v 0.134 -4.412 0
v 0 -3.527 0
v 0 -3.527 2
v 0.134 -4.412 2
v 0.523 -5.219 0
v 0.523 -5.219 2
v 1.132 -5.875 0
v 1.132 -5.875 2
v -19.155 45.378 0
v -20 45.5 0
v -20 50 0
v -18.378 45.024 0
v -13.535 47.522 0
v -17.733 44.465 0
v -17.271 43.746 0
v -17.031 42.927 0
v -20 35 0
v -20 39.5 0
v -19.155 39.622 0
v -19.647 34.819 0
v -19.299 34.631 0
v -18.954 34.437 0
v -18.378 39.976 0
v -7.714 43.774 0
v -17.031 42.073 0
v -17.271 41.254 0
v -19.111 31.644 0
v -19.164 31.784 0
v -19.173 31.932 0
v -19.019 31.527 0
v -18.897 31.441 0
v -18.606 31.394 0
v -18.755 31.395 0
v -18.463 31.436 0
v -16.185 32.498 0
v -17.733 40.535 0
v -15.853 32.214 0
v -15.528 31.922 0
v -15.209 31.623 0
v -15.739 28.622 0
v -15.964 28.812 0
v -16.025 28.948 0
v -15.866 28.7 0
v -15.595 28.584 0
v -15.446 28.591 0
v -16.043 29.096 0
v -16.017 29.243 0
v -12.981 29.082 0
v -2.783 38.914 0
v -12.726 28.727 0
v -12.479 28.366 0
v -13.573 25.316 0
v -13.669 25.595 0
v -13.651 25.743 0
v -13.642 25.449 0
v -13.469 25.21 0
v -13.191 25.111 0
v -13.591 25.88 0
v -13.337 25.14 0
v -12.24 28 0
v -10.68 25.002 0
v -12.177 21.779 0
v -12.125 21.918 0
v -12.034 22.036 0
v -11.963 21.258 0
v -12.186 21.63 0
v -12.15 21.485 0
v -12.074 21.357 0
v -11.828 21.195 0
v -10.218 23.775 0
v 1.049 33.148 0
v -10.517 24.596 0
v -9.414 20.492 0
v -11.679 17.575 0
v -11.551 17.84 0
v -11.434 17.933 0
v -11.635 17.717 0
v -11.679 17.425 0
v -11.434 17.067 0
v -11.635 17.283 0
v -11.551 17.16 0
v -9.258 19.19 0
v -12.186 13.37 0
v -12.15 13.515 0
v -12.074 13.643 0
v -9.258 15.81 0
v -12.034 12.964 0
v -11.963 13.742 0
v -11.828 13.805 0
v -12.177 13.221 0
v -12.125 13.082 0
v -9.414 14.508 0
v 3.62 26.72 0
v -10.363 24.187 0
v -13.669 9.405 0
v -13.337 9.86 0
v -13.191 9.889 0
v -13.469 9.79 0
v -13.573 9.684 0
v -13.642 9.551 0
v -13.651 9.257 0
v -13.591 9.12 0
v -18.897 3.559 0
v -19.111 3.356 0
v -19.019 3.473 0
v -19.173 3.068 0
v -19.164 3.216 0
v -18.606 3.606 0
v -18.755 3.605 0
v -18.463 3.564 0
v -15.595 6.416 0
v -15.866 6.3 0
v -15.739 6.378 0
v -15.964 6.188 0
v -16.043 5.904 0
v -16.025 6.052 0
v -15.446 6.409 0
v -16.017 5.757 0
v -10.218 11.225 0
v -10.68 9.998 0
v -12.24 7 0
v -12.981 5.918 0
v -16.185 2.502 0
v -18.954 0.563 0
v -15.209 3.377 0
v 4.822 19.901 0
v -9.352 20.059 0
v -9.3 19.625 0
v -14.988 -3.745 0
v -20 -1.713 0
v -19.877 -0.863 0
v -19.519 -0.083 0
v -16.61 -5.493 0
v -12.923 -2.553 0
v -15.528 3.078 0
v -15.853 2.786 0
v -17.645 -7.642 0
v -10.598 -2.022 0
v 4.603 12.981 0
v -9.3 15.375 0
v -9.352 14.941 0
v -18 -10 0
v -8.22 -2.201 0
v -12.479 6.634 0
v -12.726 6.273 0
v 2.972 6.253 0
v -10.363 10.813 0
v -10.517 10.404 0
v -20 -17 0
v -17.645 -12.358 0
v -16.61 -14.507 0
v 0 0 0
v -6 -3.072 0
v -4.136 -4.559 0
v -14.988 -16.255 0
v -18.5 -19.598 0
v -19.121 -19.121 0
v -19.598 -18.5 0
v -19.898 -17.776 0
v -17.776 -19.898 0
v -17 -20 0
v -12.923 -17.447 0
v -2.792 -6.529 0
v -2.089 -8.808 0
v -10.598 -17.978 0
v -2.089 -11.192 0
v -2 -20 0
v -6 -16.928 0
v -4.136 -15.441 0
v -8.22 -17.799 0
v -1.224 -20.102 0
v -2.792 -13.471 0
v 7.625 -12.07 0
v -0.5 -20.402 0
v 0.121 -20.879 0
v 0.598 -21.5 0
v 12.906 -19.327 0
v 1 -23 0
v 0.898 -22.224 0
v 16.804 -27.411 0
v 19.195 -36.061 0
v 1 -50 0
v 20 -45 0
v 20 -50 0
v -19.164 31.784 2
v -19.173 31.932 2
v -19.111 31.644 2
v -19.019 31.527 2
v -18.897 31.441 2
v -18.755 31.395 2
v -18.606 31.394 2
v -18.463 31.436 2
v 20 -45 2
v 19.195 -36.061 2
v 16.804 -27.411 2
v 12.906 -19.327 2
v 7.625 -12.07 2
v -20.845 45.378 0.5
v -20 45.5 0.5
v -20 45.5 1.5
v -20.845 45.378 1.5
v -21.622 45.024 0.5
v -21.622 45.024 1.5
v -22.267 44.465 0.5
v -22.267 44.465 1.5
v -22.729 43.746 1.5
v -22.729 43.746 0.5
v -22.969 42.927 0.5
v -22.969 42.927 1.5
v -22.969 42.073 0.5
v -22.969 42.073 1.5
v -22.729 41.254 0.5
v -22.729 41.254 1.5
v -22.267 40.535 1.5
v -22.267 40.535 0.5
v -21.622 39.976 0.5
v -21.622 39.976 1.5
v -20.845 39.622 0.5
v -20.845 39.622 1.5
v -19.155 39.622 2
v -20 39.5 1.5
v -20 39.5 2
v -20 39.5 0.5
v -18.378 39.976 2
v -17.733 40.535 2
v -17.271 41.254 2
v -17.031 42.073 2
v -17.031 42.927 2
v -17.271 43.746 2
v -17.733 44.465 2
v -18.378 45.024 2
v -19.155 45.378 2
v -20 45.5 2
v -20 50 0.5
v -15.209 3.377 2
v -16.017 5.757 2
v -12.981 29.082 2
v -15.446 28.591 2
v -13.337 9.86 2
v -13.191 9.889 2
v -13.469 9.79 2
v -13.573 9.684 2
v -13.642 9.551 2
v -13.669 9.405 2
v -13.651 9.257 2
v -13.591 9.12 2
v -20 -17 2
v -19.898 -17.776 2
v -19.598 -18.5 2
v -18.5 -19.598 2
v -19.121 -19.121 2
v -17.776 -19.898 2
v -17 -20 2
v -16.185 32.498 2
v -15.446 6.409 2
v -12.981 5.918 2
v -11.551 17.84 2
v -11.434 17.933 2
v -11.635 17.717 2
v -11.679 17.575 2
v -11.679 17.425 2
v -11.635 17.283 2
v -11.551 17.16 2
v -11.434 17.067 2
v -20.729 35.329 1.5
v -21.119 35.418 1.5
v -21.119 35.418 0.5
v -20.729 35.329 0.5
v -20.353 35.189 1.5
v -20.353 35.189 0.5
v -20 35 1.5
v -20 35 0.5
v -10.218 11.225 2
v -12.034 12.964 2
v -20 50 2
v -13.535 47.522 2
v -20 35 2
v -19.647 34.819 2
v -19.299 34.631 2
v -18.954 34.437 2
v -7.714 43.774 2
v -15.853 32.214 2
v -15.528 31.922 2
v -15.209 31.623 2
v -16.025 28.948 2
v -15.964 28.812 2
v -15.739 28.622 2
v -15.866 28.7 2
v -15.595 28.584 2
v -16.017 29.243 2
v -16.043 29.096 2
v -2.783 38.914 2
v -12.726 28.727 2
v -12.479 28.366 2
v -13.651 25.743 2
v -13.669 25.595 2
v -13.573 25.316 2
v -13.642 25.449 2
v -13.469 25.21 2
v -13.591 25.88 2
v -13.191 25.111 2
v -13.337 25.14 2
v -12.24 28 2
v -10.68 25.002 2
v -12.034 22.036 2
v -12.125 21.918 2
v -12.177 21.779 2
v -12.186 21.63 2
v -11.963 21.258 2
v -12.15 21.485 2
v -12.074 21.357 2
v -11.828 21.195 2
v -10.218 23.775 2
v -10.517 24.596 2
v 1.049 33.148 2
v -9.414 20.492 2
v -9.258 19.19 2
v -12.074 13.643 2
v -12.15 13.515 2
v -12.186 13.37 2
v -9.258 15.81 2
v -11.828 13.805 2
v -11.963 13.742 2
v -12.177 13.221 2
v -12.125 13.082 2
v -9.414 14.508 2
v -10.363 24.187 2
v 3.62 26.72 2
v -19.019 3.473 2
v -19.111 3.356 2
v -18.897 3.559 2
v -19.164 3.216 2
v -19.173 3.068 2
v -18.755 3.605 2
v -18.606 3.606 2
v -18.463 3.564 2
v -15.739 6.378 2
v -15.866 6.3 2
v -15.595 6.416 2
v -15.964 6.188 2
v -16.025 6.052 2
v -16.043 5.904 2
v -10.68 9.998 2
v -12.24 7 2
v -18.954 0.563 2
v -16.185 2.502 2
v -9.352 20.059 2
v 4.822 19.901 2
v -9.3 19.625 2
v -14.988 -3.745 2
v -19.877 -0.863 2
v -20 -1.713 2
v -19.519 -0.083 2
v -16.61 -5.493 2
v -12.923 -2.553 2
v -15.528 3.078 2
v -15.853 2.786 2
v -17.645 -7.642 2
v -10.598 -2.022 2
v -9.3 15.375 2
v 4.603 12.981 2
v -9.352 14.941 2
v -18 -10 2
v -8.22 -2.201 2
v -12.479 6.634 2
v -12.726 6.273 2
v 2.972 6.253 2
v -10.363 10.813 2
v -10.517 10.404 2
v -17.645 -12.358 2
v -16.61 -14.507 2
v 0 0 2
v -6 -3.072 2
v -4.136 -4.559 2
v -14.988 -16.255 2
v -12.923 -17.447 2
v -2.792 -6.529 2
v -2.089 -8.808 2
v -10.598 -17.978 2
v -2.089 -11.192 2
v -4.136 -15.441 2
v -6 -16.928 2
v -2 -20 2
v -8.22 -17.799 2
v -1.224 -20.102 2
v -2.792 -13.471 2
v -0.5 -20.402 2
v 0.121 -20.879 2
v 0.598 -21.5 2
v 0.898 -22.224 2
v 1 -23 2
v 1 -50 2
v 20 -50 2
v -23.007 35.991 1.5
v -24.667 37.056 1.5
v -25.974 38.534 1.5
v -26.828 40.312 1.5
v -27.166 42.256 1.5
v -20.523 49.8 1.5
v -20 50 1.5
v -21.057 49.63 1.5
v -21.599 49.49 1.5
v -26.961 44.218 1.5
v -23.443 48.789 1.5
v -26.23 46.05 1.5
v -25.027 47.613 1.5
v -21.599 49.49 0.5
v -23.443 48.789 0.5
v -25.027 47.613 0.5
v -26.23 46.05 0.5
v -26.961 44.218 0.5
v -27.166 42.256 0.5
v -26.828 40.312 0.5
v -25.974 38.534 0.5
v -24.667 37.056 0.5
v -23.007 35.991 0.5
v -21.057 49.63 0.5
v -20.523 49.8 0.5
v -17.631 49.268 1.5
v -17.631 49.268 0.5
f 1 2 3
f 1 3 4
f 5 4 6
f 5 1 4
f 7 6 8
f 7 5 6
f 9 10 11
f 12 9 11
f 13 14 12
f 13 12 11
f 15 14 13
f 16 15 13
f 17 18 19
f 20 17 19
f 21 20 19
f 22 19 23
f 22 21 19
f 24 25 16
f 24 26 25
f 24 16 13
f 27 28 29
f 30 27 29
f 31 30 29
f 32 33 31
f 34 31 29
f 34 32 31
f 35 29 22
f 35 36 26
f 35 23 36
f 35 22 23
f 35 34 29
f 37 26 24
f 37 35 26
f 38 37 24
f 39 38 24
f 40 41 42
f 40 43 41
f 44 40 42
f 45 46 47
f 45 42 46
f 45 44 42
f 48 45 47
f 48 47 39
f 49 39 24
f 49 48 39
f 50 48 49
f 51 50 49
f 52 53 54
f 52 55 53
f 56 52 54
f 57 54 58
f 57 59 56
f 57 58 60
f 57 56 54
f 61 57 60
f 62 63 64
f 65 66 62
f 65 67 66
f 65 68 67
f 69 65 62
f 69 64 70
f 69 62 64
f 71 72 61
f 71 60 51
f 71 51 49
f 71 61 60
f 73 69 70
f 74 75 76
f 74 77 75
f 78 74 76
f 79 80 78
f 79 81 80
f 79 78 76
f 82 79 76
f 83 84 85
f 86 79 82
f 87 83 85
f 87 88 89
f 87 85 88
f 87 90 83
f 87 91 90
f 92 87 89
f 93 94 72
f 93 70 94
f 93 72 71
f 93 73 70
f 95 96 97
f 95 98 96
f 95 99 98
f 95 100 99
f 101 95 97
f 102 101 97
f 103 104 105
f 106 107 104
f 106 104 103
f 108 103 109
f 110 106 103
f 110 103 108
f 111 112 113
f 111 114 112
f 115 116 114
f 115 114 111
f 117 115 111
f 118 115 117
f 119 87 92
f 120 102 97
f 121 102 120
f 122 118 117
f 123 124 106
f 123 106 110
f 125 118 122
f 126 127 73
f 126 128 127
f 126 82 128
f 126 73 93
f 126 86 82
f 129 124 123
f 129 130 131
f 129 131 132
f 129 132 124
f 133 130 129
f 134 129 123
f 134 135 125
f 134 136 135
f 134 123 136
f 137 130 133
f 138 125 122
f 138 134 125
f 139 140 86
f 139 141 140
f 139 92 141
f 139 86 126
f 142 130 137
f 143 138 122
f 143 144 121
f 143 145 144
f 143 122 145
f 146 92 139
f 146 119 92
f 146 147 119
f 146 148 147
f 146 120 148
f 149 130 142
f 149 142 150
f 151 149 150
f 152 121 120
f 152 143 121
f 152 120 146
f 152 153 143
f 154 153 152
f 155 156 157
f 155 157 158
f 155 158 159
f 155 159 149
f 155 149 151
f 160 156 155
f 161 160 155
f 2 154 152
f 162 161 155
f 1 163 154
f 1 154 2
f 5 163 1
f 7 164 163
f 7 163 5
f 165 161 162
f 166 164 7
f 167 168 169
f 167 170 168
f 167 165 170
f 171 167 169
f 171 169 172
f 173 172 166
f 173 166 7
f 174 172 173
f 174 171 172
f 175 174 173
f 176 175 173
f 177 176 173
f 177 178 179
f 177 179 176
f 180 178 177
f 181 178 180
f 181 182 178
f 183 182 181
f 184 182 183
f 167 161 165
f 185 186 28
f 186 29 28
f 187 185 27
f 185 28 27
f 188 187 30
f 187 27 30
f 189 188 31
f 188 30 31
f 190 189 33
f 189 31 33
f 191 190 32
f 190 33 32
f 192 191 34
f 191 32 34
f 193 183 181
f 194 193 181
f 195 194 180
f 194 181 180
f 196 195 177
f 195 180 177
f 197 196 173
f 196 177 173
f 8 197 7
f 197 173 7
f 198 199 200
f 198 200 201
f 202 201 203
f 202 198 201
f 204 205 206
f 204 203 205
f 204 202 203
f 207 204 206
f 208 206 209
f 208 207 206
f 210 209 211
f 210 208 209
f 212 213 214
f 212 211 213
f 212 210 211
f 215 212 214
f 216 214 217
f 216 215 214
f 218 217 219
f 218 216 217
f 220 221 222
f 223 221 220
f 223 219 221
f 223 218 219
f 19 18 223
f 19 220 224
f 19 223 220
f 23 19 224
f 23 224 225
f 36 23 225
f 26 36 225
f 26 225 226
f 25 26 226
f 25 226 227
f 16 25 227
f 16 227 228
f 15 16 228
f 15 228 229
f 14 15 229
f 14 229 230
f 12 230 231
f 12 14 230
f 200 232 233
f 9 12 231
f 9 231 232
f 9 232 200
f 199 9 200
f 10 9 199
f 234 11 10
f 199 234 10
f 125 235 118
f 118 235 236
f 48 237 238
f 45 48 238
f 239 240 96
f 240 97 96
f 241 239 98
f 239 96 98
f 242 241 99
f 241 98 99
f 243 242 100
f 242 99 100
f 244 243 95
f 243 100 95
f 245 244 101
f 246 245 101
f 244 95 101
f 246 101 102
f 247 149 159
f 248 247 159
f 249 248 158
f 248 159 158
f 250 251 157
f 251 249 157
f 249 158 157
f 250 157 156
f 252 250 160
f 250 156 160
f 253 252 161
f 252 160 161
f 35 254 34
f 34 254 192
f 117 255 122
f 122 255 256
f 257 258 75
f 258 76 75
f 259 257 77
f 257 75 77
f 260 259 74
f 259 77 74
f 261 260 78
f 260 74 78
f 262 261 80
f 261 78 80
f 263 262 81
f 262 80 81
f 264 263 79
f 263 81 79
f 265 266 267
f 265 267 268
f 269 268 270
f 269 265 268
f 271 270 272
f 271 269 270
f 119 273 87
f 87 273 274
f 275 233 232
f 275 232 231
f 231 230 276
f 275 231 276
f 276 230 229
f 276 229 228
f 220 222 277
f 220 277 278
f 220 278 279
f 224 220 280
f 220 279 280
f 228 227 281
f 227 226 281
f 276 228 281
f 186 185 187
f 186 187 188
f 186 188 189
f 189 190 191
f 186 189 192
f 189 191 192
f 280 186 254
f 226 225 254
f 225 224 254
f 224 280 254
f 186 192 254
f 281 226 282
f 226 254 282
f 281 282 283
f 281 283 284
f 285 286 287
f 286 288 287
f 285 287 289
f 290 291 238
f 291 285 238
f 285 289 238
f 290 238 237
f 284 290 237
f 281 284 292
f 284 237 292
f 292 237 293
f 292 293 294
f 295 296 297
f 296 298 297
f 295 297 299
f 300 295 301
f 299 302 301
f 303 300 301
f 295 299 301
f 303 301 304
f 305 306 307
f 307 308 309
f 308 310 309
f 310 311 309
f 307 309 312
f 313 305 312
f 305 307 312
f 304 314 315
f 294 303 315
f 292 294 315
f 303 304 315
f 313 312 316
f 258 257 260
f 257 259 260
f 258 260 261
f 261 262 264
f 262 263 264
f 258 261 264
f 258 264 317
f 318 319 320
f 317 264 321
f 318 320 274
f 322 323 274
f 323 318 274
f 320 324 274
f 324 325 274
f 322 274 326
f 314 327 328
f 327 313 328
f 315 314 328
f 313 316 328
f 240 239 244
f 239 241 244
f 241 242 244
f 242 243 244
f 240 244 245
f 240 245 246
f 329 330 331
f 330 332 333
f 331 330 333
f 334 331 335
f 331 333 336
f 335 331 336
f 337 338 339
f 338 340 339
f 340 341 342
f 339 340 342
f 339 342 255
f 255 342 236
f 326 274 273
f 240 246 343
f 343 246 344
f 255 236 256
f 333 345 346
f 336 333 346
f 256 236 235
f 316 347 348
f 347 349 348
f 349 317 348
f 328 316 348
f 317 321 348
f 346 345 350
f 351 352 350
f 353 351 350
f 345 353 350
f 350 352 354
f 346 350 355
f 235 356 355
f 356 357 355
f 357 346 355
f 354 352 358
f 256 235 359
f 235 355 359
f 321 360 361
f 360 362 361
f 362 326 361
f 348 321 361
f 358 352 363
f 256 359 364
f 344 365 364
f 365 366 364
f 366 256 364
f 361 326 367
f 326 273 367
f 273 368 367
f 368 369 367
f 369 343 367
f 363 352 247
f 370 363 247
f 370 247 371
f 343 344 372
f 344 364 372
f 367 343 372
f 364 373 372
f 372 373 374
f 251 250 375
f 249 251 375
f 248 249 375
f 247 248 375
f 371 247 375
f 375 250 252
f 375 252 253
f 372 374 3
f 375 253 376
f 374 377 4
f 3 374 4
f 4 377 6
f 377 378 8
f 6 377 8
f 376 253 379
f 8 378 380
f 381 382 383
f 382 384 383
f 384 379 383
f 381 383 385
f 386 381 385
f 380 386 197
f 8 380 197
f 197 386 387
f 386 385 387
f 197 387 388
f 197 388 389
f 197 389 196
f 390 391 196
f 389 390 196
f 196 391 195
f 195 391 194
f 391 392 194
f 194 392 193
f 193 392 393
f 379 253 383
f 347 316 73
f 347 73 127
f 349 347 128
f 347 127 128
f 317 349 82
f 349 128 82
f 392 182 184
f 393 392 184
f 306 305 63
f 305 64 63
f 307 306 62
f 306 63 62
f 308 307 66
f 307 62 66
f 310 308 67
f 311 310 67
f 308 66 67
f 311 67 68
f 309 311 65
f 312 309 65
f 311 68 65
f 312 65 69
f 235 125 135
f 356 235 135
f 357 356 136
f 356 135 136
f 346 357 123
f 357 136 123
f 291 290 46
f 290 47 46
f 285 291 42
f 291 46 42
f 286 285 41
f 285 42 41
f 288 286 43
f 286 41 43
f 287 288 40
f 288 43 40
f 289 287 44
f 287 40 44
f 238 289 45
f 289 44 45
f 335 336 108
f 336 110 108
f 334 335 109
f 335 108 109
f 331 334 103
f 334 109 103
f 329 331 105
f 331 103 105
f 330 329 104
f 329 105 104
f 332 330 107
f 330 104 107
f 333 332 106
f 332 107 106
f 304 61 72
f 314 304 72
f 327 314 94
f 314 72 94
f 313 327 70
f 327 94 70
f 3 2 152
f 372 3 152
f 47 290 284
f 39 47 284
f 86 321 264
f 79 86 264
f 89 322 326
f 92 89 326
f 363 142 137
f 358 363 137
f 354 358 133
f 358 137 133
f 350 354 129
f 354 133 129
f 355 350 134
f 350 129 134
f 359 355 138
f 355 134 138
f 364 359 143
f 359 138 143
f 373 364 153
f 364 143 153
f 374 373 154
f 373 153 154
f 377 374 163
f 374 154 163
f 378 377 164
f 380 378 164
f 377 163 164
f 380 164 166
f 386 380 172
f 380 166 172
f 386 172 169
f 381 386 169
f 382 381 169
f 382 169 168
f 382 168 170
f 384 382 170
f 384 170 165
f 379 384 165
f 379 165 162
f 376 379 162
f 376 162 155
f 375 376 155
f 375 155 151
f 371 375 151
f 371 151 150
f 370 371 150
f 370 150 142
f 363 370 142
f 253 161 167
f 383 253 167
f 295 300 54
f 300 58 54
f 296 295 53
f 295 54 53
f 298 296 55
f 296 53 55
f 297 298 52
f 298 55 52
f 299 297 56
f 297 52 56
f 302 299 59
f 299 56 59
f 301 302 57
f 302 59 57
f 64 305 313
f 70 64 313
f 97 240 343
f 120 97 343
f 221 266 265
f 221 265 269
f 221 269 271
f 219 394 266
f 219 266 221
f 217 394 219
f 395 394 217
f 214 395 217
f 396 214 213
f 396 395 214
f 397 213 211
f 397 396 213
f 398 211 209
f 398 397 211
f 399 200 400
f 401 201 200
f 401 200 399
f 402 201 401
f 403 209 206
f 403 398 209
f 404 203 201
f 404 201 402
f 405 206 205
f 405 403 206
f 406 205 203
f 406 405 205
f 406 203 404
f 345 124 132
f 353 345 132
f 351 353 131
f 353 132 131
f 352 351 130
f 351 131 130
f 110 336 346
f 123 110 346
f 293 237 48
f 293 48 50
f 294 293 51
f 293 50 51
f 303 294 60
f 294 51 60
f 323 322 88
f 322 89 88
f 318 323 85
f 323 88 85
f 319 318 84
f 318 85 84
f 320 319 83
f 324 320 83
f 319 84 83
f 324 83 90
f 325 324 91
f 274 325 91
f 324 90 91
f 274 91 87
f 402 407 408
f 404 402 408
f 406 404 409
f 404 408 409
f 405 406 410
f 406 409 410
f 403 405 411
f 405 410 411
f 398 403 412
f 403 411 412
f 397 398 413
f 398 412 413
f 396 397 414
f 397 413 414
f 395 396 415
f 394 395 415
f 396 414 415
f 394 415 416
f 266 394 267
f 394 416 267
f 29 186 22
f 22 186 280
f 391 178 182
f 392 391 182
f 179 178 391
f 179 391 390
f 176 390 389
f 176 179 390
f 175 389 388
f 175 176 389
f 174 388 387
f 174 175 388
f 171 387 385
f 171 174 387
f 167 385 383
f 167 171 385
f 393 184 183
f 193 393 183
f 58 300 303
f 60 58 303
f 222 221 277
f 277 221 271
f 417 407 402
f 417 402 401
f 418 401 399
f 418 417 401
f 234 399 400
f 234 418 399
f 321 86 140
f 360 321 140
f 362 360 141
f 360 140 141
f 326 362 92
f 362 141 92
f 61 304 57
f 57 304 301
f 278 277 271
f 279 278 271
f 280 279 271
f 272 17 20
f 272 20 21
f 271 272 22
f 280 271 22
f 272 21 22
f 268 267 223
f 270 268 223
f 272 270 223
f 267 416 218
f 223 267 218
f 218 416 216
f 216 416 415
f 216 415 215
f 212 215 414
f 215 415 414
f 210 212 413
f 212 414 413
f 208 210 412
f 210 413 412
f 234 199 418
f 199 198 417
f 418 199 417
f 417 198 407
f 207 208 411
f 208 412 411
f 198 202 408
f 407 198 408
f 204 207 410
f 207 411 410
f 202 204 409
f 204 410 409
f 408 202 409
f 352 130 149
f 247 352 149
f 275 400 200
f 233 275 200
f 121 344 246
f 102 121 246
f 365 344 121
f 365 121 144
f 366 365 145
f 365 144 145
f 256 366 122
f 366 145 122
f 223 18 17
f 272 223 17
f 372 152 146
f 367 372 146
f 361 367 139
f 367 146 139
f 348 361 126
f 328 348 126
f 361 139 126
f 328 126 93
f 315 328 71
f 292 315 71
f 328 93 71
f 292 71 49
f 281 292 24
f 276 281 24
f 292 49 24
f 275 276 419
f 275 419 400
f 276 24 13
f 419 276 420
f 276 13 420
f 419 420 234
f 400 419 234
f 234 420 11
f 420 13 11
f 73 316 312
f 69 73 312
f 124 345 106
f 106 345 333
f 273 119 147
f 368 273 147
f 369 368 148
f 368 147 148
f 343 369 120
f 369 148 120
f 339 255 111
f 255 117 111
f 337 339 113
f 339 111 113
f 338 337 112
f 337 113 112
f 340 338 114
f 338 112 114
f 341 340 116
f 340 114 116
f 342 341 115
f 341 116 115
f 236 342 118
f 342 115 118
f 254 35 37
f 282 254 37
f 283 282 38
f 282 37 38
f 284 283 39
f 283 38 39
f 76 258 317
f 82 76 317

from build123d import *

# Parameters (mm, degrees)
BOSS_EXTRUDE1_DEPTH       = 2
BOSS_EXTRUDE2_DEPTH       = 2
CIRPATTERN1_COUNT         = 5
CIRPATTERN1_ANGLE         = 55
CIRPATTERN2_COPY_1_DEPTH  = 2
CIRPATTERN2_COPY_2_DEPTH  = 2
CIRPATTERN2_COPY_3_DEPTH  = 2
CIRPATTERN2_COPY_4_DEPTH  = 2
CIRPATTERN2_COPY_5_DEPTH  = 2
CIRPATTERN2_COPY_6_DEPTH  = 2
CIRPATTERN2_COPY_7_DEPTH  = 2
CIRPATTERN2_COPY_8_DEPTH  = 2
CIRPATTERN2_COPY_9_DEPTH  = 2
CIRPATTERN2_COPY_10_DEPTH = 2
CIRPATTERN2_COPY_11_DEPTH = 2
CIRPATTERN2_COPY_12_DEPTH = 2
CIRPATTERN2_COPY_13_DEPTH = 2
CIRPATTERN2_COPY_14_DEPTH = 2
CIRPATTERN2_COPY_15_DEPTH = 2
CIRPATTERN2_COPY_16_DEPTH = 2
CIRPATTERN2_COPY_17_DEPTH = 2
CIRPATTERN2_COPY_18_DEPTH = 2
CIRPATTERN2_COPY_19_DEPTH = 2
CIRPATTERN2_COPY_20_DEPTH = 2
SKETCH3_R                 = 8
CUT_EXTRUDE1_DEPTH        = 54.888774341
BOSS_EXTRUDE3_DEPTH       = 0.5
BOSS_EXTRUDE3_DEPTH_BACK  = 0.5
SKETCH4_R                 = 7.170254919
CUT_EXTRUDE2_DEPTH        = 57.914170049
CUT_EXTRUDE2_DEPTH_BACK   = 57.914170049
SKETCH5_R                 = 3
FILLET1_R                 = 50
FILLET2_R                 = 10
FILLET3_R                 = 3
FILLET4_R                 = 0.5


with BuildPart() as part:
    # Sketch1 → Boss-Extrude1 (new body)
    with BuildSketch(Plane.XY):
        with BuildLine():
            Line((-20, -5), (-20, -20))
            Line((-20, -20), (0, -20))
            Line((0, -20), (1, -20))
            Line((1, -20), (1, -50))
            Line((1, -50), (20, -50))
            Line((20, -50), (20, -5))
            Line((20, -5), (0, -5))
            Line((0, -5), (0, 0))
            ThreePointArc((0, 0), (2.5, 30), (-20, 50))
            Line((-20, 50), (-20, 35))
            ThreePointArc((-20, 35), (-9.184405197, 17.5), (-20, 0))
            Line((-20, 0), (-20, -5))
        make_face()
    extrude(amount=BOSS_EXTRUDE1_DEPTH)

    # Sketch2 → Boss-Extrude2 (add)
    with BuildSketch(Plane.XY.offset(2)):
        Polygon((-12.184405197, 17.5), (-8.511312338, 19.620661151), (-8.511312338, 15.379338849), align=None)
    boss_extrude2 = extrude(amount=-BOSS_EXTRUDE2_DEPTH)

    # CirPattern1: Boss-Extrude2 ×5 about axis
    cirpattern1_axis = Axis((-28.75, 17.5, 0), (0, 0, -1))
    for i in range(1, CIRPATTERN1_COUNT):
        add(boss_extrude2.rotate(cirpattern1_axis, i * CIRPATTERN1_ANGLE / (CIRPATTERN1_COUNT - 1)))

    # CirPattern2 copy 1 sketch → CirPattern2 copy 1 (add)
    with BuildSketch(Plane.XY.offset(2)):
        Polygon((-12.184405197, 17.5), (-8.511312338, 19.620661151), (-8.511312338, 15.379338849), align=None)
    extrude(amount=-CIRPATTERN2_COPY_1_DEPTH)

    # CirPattern2 copy 2 sketch → CirPattern2 copy 2 (add)
    with BuildSketch(Plane(origin=(3.335587623, 7.334983183, 2), x_dir=(0.9713420698132613, 0.23768589232617357, 0), z_dir=(0, 0, 1))):
        Polygon((-12.184405197, 17.5), (-8.511312338, 19.620661151), (-8.511312338, 15.379338849), align=None)
    extrude(amount=-CIRPATTERN2_COPY_2_DEPTH)

    # CirPattern2 copy 3 sketch → CirPattern2 copy 3 (add)
    with BuildSketch(Plane(origin=(4.832162185, 15.25258305, 2), x_dir=(0.8870108331782213, 0.46174861323503485, 0), z_dir=(0, 0, 1))):
        Polygon((-12.184405197, 17.5), (-8.511312338, 19.620661151), (-8.511312338, 15.379338849), align=None)
    extrude(amount=-CIRPATTERN2_COPY_3_DEPTH)

    # CirPattern2 copy 4 sketch → CirPattern2 copy 4 (add)
    with BuildSketch(Plane(origin=(4.403946229, 23.298995553, 2), x_dir=(0.7518398074789764, 0.6593458151000701, 0), z_dir=(0, 0, 1))):
        Polygon((-12.184405197, 17.5), (-8.511312338, 19.620661151), (-8.511312338, 15.379338849), align=None)
    extrude(amount=-CIRPATTERN2_COPY_4_DEPTH)

    # CirPattern2 copy 5 sketch → CirPattern2 copy 5 (add)
    with BuildSketch(Plane(origin=(-4.983418609, -6.331955626, 2), x_dir=(0.9713420698132613, -0.23768589232617357, 0), z_dir=(0, 0, 1))):
        Polygon((-12.184405197, 17.5), (-8.511312338, 19.620661151), (-8.511312338, 15.379338849), align=None)
    extrude(amount=-CIRPATTERN2_COPY_5_DEPTH)

    # CirPattern2 copy 6 sketch → CirPattern2 copy 6 (add)
    with BuildSketch(Plane.XY.offset(2)):
        Polygon((-12.184405197, 17.5), (-8.511312338, 19.620661151), (-8.511312338, 15.379338849), align=None)
    extrude(amount=-CIRPATTERN2_COPY_6_DEPTH)

    # CirPattern2 copy 7 sketch → CirPattern2 copy 7 (add)
    with BuildSketch(Plane(origin=(3.335587623, 7.334983183, 2), x_dir=(0.9713420698132613, 0.2376858923261736, 0), z_dir=(0, 0, 1))):
        Polygon((-12.184405197, 17.5), (-8.511312338, 19.620661151), (-8.511312338, 15.379338849), align=None)
    extrude(amount=-CIRPATTERN2_COPY_7_DEPTH)

    # CirPattern2 copy 8 sketch → CirPattern2 copy 8 (add)
    with BuildSketch(Plane(origin=(4.832162185, 15.25258305, 2), x_dir=(0.8870108331782214, 0.4617486132350349, 0), z_dir=(0, 0, 1))):
        Polygon((-12.184405197, 17.5), (-8.511312338, 19.620661151), (-8.511312338, 15.379338849), align=None)
    extrude(amount=-CIRPATTERN2_COPY_8_DEPTH)

    # CirPattern2 copy 9 sketch → CirPattern2 copy 9 (add)
    with BuildSketch(Plane(origin=(-11.329039278, -11.297962211, 2), x_dir=(0.8870108331782213, -0.46174861323503485, 0), z_dir=(0, 0, 1))):
        Polygon((-12.184405197, 17.5), (-8.511312338, 19.620661151), (-8.511312338, 15.379338849), align=None)
    extrude(amount=-CIRPATTERN2_COPY_9_DEPTH)

    # CirPattern2 copy 10 sketch → CirPattern2 copy 10 (add)
    with BuildSketch(Plane(origin=(-4.983418609, -6.331955626, 2), x_dir=(0.9713420698132613, -0.2376858923261736, 0), z_dir=(0, 0, 1))):
        Polygon((-12.184405197, 17.5), (-8.511312338, 19.620661151), (-8.511312338, 15.379338849), align=None)
    extrude(amount=-CIRPATTERN2_COPY_10_DEPTH)

    # CirPattern2 copy 11 sketch → CirPattern2 copy 11 (add)
    with BuildSketch(Plane.XY.offset(2)):
        Polygon((-12.184405197, 17.5), (-8.511312338, 19.620661151), (-8.511312338, 15.379338849), align=None)
    extrude(amount=-CIRPATTERN2_COPY_11_DEPTH)

    # CirPattern2 copy 12 sketch → CirPattern2 copy 12 (add)
    with BuildSketch(Plane(origin=(3.335587623, 7.334983183, 2), x_dir=(0.9713420698132613, 0.2376858923261736, 0), z_dir=(0, 0, 1))):
        Polygon((-12.184405197, 17.5), (-8.511312338, 19.620661151), (-8.511312338, 15.379338849), align=None)
    extrude(amount=-CIRPATTERN2_COPY_12_DEPTH)

    # CirPattern2 copy 13 sketch → CirPattern2 copy 13 (add)
    with BuildSketch(Plane(origin=(-18.673157299, -14.613388815, 2), x_dir=(0.7518398074789764, -0.6593458151000701, 0), z_dir=(0, 0, 1))):
        Polygon((-12.184405197, 17.5), (-8.511312338, 19.620661151), (-8.511312338, 15.379338849), align=None)
    extrude(amount=-CIRPATTERN2_COPY_13_DEPTH)

    # CirPattern2 copy 14 sketch → CirPattern2 copy 14 (add)
    with BuildSketch(Plane(origin=(-11.329039278, -11.297962211, 2), x_dir=(0.8870108331782214, -0.4617486132350349, 0), z_dir=(0, 0, 1))):
        Polygon((-12.184405197, 17.5), (-8.511312338, 19.620661151), (-8.511312338, 15.379338849), align=None)
    extrude(amount=-CIRPATTERN2_COPY_14_DEPTH)

    # CirPattern2 copy 15 sketch → CirPattern2 copy 15 (add)
    with BuildSketch(Plane(origin=(-4.983418609, -6.331955626, 2), x_dir=(0.9713420698132613, -0.2376858923261736, 0), z_dir=(0, 0, 1))):
        Polygon((-12.184405197, 17.5), (-8.511312338, 19.620661151), (-8.511312338, 15.379338849), align=None)
    extrude(amount=-CIRPATTERN2_COPY_15_DEPTH)

    # CirPattern2 copy 16 sketch → CirPattern2 copy 16 (add)
    with BuildSketch(Plane.XY.offset(2)):
        Polygon((-12.184405197, 17.5), (-8.511312338, 19.620661151), (-8.511312338, 15.379338849), align=None)
    extrude(amount=-CIRPATTERN2_COPY_16_DEPTH)

    # CirPattern2 copy 17 sketch → CirPattern2 copy 17 (add)
    with BuildSketch(Plane(origin=(3.335587623, 7.334983183, 2), x_dir=(0.9713420698132613, 0.2376858923261736, 0), z_dir=(0, 0, 1))):
        Polygon((-12.184405197, 17.5), (-8.511312338, 19.620661151), (-8.511312338, 15.379338849), align=None)
    extrude(amount=-CIRPATTERN2_COPY_17_DEPTH)

    # CirPattern2 copy 18 sketch → CirPattern2 copy 18 (add)
    with BuildSketch(Plane(origin=(4.832162185, 15.25258305, 2), x_dir=(0.8870108331782213, 0.46174861323503485, 0), z_dir=(0, 0, 1))):
        Polygon((-12.184405197, 17.5), (-8.511312338, 19.620661151), (-8.511312338, 15.379338849), align=None)
    extrude(amount=-CIRPATTERN2_COPY_18_DEPTH)

    # CirPattern2 copy 19 sketch → CirPattern2 copy 19 (add)
    with BuildSketch(Plane(origin=(4.403946229, 23.298995553, 2), x_dir=(0.7518398074789764, 0.6593458151000701, 0), z_dir=(0, 0, 1))):
        Polygon((-12.184405197, 17.5), (-8.511312338, 19.620661151), (-8.511312338, 15.379338849), align=None)
    extrude(amount=-CIRPATTERN2_COPY_19_DEPTH)

    # CirPattern2 copy 20 sketch → CirPattern2 copy 20 (add)
    with BuildSketch(Plane(origin=(2.07548332, 31.013033637, 2), x_dir=(0.5735764363510444, 0.819152044288993, 0), z_dir=(0, 0, 1))):
        Polygon((-12.184405197, 17.5), (-8.511312338, 19.620661151), (-8.511312338, 15.379338849), align=None)
    extrude(amount=-CIRPATTERN2_COPY_20_DEPTH)

    # Sketch3 → Cut-Extrude1 (cut, through all)
    with BuildSketch(Plane(origin=(0, 0, 0), x_dir=(-1, 0, 0), z_dir=(0, 0, -1))):
        with Locations((10, -10)):
            Circle(SKETCH3_R)
    extrude(amount=-CUT_EXTRUDE1_DEPTH, mode=Mode.SUBTRACT)

    # Sketch4 → Boss-Extrude3 (add, two sides: drawn at the far end of the back side and taken through both)
    with BuildSketch(Plane.XY.offset(1).offset(-BOSS_EXTRUDE3_DEPTH_BACK)):
        with Locations((-20, 42.5)):
            Circle(SKETCH4_R)
    extrude(amount=BOSS_EXTRUDE3_DEPTH + BOSS_EXTRUDE3_DEPTH_BACK)

    # Sketch5 → Cut-Extrude2 (cut, two sides: drawn at the far end of the back side and taken through both)
    with BuildSketch(Plane.XY.offset(1).offset(-CUT_EXTRUDE2_DEPTH_BACK)):
        with Locations(Location((-20, 42.5, 0), (0, 0, 90))):
            Circle(SKETCH5_R)
    extrude(amount=CUT_EXTRUDE2_DEPTH + CUT_EXTRUDE2_DEPTH_BACK, mode=Mode.SUBTRACT)

    # Fillet1
    # the kernel refuses this fillet: 50 mm, written as the material it takes off along each edge
    with BuildSketch(Plane(origin=(20, -5, -100), x_dir=(-1, 0, 0), z_dir=(0, 0, 1))) as fillet1_piece_1:
        with BuildLine():
            CenterArc((50, 40), FILLET1_R, 180, 53.130102354)
            Line((0, 40), (-1, 40))
            Line((-1, 40), (-1, 0))
            Line((-1, 0), (0, -1))
            ThreePointArc((0, -1), (10, -1), (19.4, -0.8))
            Line((19.4, -0.8), (20, 0))
        make_face()
    extrude(amount=202, mode=Mode.SUBTRACT)

    # Fillet2
    # the kernel refuses this fillet: 10 mm, written as the material it adds along each edge
    with BuildSketch(Plane(origin=(-20, 49.670254919, 0.5), x_dir=(0, 1, 0), z_dir=(0, 0, 1))) as fillet2_piece_1:
        with BuildLine():
            CenterArc((9.56758868, 3.829131186), FILLET2_R, 192.885861341, 9.62838373)
            Line((-0.180573871, 1.599035475), (-0.375537122, 1.55443356))
            ThreePointArc((-0.375537122, 1.55443356), (-0.244023303, 0.78215679), (-0.2, 0))
            Line((-0.2, 0), (0, -0.2))
            ThreePointArc((0, -0.2), (0.16487254, -0.2), (0.144988209, -0.076582624))
            Line((0.144988209, -0.076582624), (0.329745081, 0))
        make_face()
    extrude(amount=1)

    # Fillet3
    # the kernel refuses this fillet: 3 mm, written as the material it adds along each edge
    with BuildSketch(Plane(origin=(0, -5, 0), x_dir=(0.7913345913846653, -0.6113833204120512, 0), z_dir=(0, 0, 1))) as fillet3_piece_1:
        with BuildLine():
            CenterArc((1.473507854, 2.999692996), FILLET3_R, 217.689593385, 51.490710876)
            Line((-0.90049592, 1.165543035), (-0.947975995, 1.128860036))
            Line((-0.947975995, 1.128860036), (-0.047480075, -0.036682999))
            Line((-0.047480075, -0.036682999), (0.000858354, -0.05999386))
            ThreePointArc((0.000858354, -0.05999386), (0.715295075, -0.054883268), (1.429731796, -0.05999386))
            Line((1.429731796, -0.05999386), (1.43059015, 0))
        make_face()
    extrude(amount=2)
    with BuildSketch(Plane(origin=(1, -20, 0), x_dir=(-1, 0, 0), z_dir=(0, 0, 1))) as fillet3_piece_2:
        with BuildLine():
            CenterArc((FILLET3_R, FILLET3_R), FILLET3_R, 180, 90)
            Line((0, FILLET3_R), (-FILLET3_R * 0.02, FILLET3_R))
            Line((-FILLET3_R * 0.02, FILLET3_R), (-FILLET3_R * 0.02, -FILLET3_R * 0.02))
            Line((-FILLET3_R * 0.02, -FILLET3_R * 0.02), (FILLET3_R, -FILLET3_R * 0.02))
            Line((FILLET3_R, -FILLET3_R * 0.02), (FILLET3_R, 0))
        make_face()
    extrude(amount=2)
    with BuildSketch(Plane(origin=(-20, 35.329745081, 1.5), x_dir=(0, -1, 0), z_dir=(0, 0, -1))) as fillet3_piece_3:
        with BuildLine():
            CenterArc((2.875350756, 1.587416691), FILLET3_R, 188.979685055, 22.967606948)
            Line((-0.087880477, 1.119163917), (-0.147145102, 1.109798862))
            ThreePointArc((-0.147145102, 1.109798862), (-0.081819755, 0.556607533), (-0.06, 0))
            Line((-0.06, 0), (0, -0.06))
            ThreePointArc((0, -0.06), (0.16487254, -0.06), (0.278832967, -0.031748334))
            Line((0.278832967, -0.031748334), (0.329745081, 0))
        make_face()
    extrude(amount=1)
    # the kernel refuses this fillet: 3 mm, written as the material it takes off along each edge
    with BuildSketch(Plane(origin=(-20, -20, -7.5), x_dir=(1, 0, 0), z_dir=(0, 0, 1))) as fillet3_2_piece_1:
        with BuildLine():
            CenterArc((FILLET3_R, FILLET3_R), FILLET3_R, 180, 90)
            Line((0, FILLET3_R), (-FILLET3_R * 0.02, FILLET3_R))
            Line((-FILLET3_R * 0.02, FILLET3_R), (-FILLET3_R * 0.02, -FILLET3_R * 0.02))
            Line((-FILLET3_R * 0.02, -FILLET3_R * 0.02), (FILLET3_R, -FILLET3_R * 0.02))
            Line((FILLET3_R, -FILLET3_R * 0.02), (FILLET3_R, 0))
        make_face()
    extrude(amount=17, mode=Mode.SUBTRACT)
    with BuildSketch(Plane(origin=(-20, 0, -4.282755208), x_dir=(0.8804344923841002, 0.47416780217592974, 0), z_dir=(0, 0, 1))) as fillet3_2_piece_2:
        with BuildLine():
            CenterArc((1.829005627, -2.93077757), FILLET3_R, 102.332157439, 49.362663028)
            Line((-0.81229785, -1.508274163), (-0.865123919, -1.479824095))
            Line((-0.865123919, -1.479824095), (-0.05282607, 0.028450068))
            Line((-0.05282607, 0.028450068), (0.001821978, 0.05997233))
            ThreePointArc((0.001821978, 0.05997233), (0.59413473, 0.050977083), (1.175454736, 0.058615551))
            Line((1.175454736, 0.058615551), (1.188269459, 0))
        make_face()
    extrude(amount=10.565510417, mode=Mode.SUBTRACT)

    # Fillet4
    fillet4_edges = [part.edges().sort_by_distance(p)[0] for p in [
        (-19.248365167, 3.930259152, 1),
        (-12.659140856, 21.437408183, 1),
        (-14.056137952, 25.149140428, 1),
        (-16.295326392, 28.422455608, 1),
        (-19.248365167, 31.069740848, 1),
        (-12.184405197, 17.5, 1),
        (-12.659140856, 13.562591817, 1),
        (-14.056137952, 9.850859572, 1),
        (-16.295326392, 6.577544392, 1),
    ]]
    fillet(fillet4_edges, radius=FILLET4_R)


solid = part.part
